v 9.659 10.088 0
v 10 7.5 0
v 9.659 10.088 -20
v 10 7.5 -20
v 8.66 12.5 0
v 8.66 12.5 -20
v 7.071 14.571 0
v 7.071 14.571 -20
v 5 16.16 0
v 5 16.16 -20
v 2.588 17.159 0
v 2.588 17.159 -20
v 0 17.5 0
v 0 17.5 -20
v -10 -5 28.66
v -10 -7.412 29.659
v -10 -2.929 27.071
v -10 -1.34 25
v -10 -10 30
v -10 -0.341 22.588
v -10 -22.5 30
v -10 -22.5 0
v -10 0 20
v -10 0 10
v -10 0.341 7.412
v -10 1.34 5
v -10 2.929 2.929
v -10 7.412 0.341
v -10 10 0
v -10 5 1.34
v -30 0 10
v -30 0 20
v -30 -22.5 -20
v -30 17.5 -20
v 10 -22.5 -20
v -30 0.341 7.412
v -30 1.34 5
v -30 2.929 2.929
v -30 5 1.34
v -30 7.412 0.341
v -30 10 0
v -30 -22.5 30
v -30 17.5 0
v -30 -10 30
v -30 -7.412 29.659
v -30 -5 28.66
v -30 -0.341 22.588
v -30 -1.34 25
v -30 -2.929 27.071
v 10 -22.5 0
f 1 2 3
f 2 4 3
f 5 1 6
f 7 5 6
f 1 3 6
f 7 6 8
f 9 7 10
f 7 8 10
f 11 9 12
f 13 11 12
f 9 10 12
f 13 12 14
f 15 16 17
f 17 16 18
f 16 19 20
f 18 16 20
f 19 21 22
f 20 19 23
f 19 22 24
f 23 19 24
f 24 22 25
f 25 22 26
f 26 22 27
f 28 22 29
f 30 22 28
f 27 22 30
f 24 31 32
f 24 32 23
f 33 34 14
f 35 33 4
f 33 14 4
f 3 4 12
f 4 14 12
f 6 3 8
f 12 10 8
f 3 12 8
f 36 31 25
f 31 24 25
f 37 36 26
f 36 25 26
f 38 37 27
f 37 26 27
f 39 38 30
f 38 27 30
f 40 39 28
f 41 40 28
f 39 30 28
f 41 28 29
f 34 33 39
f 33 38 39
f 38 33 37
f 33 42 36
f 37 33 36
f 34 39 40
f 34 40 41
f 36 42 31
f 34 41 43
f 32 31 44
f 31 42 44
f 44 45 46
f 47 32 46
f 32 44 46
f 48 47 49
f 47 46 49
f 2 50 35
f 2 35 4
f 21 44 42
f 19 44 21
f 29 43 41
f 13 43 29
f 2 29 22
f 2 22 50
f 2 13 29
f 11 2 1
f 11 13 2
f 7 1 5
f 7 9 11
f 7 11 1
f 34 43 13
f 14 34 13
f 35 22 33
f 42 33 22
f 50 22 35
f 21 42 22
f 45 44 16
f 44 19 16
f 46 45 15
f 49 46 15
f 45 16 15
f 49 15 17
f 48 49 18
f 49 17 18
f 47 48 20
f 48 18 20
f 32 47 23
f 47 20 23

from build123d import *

# Parameters (mm, degrees)
SKETCH1_W           = 20
SKETCH1_H           = 22.5
BOSS_EXTRUDE1_DEPTH = 30
SKETCH2_W           = 40
SKETCH2_H           = 40
BOSS_EXTRUDE2_DEPTH = 20
FILLET1_R           = 10


with BuildPart() as part:
    # Sketch1 → Boss-Extrude1 (new body)
    with BuildSketch(Plane.XY):
        with Locations((-20, -11.25)):
            Rectangle(SKETCH1_W, SKETCH1_H)
    extrude(amount=BOSS_EXTRUDE1_DEPTH)

    # Sketch2 → Boss-Extrude2 (add)
    with BuildSketch(Plane.XY):
        with Locations((-10, -2.5)):
            Rectangle(SKETCH2_W, SKETCH2_H)
    extrude(amount=-BOSS_EXTRUDE2_DEPTH)

    # Fillet1
    fillet1_edges = [part.edges().sort_by_distance(p)[0] for p in [
        (-20, 0, 0),
        (10, 17.5, -10),
        (-20, 0, 30),
    ]]
    fillet(fillet1_edges, radius=FILLET1_R)


solid = part.part
